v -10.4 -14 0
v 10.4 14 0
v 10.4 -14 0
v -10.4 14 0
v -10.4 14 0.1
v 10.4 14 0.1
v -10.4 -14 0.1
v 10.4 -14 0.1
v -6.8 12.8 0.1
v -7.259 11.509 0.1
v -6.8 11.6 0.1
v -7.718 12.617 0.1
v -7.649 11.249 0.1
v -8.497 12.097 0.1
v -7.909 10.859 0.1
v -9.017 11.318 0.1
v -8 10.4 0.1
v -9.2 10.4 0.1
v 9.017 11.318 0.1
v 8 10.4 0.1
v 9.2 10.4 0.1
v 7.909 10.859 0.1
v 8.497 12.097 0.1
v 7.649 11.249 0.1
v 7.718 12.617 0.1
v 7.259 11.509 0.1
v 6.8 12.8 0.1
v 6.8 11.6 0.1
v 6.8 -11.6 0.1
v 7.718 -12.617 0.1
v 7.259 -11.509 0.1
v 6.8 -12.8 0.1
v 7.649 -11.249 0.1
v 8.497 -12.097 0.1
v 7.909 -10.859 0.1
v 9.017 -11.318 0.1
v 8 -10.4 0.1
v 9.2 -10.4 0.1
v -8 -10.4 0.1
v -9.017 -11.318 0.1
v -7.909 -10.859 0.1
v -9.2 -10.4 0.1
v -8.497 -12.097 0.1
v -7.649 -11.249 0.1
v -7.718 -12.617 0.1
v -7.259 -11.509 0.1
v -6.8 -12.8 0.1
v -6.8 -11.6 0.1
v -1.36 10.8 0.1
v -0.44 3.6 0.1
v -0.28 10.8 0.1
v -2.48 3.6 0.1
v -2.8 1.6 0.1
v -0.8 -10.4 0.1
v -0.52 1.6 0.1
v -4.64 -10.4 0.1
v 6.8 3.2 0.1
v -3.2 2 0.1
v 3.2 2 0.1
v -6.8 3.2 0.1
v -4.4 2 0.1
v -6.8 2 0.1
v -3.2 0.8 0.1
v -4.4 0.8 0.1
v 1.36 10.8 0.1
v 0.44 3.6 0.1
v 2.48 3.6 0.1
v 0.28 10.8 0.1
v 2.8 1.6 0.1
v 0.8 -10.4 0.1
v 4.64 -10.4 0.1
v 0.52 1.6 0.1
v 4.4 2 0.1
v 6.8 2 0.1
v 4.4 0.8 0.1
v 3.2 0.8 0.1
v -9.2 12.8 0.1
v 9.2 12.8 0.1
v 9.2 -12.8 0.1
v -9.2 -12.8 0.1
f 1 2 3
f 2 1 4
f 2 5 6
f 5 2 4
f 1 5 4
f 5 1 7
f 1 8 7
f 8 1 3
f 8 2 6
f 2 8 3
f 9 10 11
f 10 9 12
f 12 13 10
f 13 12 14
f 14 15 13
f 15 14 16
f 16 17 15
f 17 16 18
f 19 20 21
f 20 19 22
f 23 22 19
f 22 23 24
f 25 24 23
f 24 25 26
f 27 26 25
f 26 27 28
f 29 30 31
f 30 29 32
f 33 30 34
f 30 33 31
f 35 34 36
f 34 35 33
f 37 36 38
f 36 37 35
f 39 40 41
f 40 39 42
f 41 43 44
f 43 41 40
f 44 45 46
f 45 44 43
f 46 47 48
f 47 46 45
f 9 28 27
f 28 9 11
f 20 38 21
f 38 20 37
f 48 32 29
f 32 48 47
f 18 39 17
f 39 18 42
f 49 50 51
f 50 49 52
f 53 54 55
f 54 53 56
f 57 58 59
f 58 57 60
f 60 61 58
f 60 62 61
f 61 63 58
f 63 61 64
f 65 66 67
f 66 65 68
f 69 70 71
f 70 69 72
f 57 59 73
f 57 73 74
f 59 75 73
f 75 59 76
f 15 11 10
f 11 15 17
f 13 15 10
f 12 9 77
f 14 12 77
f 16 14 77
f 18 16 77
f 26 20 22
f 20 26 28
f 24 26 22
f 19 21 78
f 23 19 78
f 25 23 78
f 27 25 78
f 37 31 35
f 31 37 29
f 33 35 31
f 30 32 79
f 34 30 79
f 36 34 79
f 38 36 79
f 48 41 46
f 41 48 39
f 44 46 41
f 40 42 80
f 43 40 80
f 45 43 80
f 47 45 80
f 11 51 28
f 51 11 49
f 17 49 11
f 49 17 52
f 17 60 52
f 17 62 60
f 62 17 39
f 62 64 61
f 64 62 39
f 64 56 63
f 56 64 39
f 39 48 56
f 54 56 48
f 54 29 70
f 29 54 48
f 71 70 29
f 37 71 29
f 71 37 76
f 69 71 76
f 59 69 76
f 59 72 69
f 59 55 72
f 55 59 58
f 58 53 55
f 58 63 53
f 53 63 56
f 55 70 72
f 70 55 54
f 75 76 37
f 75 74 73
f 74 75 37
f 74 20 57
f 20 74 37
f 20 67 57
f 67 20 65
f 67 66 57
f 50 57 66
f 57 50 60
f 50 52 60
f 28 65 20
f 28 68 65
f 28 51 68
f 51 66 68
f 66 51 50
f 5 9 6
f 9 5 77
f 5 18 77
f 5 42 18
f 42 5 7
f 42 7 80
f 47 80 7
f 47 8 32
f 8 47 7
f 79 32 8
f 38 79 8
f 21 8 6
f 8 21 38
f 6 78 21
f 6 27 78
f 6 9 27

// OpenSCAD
// file: ../p/1-4ndis.scad
use <../lib.scad>
function ldraw_lib__1_4ndis() = [
// 0 Disc Negative 0.25
// 0 Name: 1-4ndis.dat
// 0 Author: James Jessiman
// 0 !LDRAW_ORG Primitive UPDATE 2012-01
// 0 !LICENSE Licensed under CC BY 4.0 : see CAreadme.txt
// 
// 0 BFC CERTIFY CCW
  [0,"BFC","CERTIFY"],
  [0,"BFC","CCW"],
// 
// 0 !HISTORY 2002-03-23 [sbliss] Added BFC Statement
// 0 !HISTORY 2002-04-25 [PTadmin] Official Update 2002-02
// 0 !HISTORY 2007-06-22 [PTadmin] Header formatted for Contributor Agreement
// 0 !HISTORY 2008-07-01 [PTadmin] Official Update 2008-01
// 0 !HISTORY 2012-02-16 [Philo] Changed to CCW
// 0 !HISTORY 2012-03-30 [PTadmin] Official Update 2012-01
// 
// 
// 3 16 0.9239 0 0.3827 1 0 0 1 0 1
  [3,16,0.9239,0,0.3827,1,0,0,1,0,1],
// 3 16 0.7071 0 0.7071 0.9239 0 0.3827 1 0 1
  [3,16,0.7071,0,0.7071,0.9239,0,0.3827,1,0,1],
// 3 16 0.3827 0 0.9239 0.7071 0 0.7071 1 0 1
  [3,16,0.3827,0,0.9239,0.7071,0,0.7071,1,0,1],
// 3 16 0 0 1 0.3827 0 0.9239 1 0 1
  [3,16,0,0,1,0.3827,0,0.9239,1,0,1],
];
module ldraw_lib__1_4ndis(step=0, col=false, unit=2/5, alt=false, line=0.2, solid=!$preview)
    makepoly(ldraw_lib__1_4ndis(), step=step, col=col, unit=unit, alt=alt, line=line, solid=solid);
ldraw_lib__1_4ndis(line=0.2);
// file: ../p/1-4chrd.scad
use <../lib.scad>
function ldraw_lib__1_4chrd() = [
// 0 Chord 0.25
// 0 Name: 1-4chrd.dat
// 0 Author: Tony Hafner [hafhead]
// 0 !LDRAW_ORG Primitive UPDATE 2012-02
// 0 !LICENSE Licensed under CC BY 2.0 and CC BY 4.0 : see CAreadme.txt
// 
// 0 BFC CERTIFY CCW
  [0,"BFC","CERTIFY"],
  [0,"BFC","CCW"],
// 
// 0 !HISTORY 2004-04-22 [PTadmin] Official Update 2004-02
// 0 !HISTORY 2007-10-09 [PTadmin] Header formatted for Contributor Agreement
// 0 !HISTORY 2008-07-01 [PTadmin] Official Update 2008-01
// 0 !HISTORY 2012-08-02 [MMR1988] Re-creation with PrimGen2 and Rectifier
// 0 !HISTORY 2012-08-09 [PTadmin] Official Update 2012-02
// 
// 
// 4 16 0.9239 0 0.3827 0.3827 0 0.9239 0 0 1 1 0 0
  [4,16,0.9239,0,0.3827,0.3827,0,0.9239,0,0,1,1,0,0],
// 3 16 0.7071 0 0.7071 0.3827 0 0.9239 0.9239 0 0.3827
  [3,16,0.7071,0,0.7071,0.3827,0,0.9239,0.9239,0,0.3827],
];
module ldraw_lib__1_4chrd(step=0, col=false, unit=2/5, alt=false, line=0.2, solid=!$preview)
    makepoly(ldraw_lib__1_4chrd(), step=step, col=col, unit=unit, alt=alt, line=line, solid=solid);
ldraw_lib__1_4chrd(line=0.2);
// file: ../p/1-4ring1.scad
use <../lib.scad>
function ldraw_lib__1_4ring1() = [
// 0 Ring  1 x 0.25
// 0 Name: 1-4ring1.dat
// 0 Author: Chris Dee [cwdee]
// 0 !LDRAW_ORG Primitive UPDATE 2012-01
// 0 !LICENSE Licensed under CC BY 4.0 : see CAreadme.txt
// 
// 0 BFC CERTIFY CCW
  [0,"BFC","CERTIFY"],
  [0,"BFC","CCW"],
// 
// 0 !HISTORY 2000-05-07 [PTadmin] Official Update 2000-01
// 0 !HISTORY 2002-11-22 [hafhead] Added BFC statement
// 0 !HISTORY 2002-11-30 [PTadmin] Official Update 2002-05
// 0 !HISTORY 2007-06-22 [PTadmin] Header formatted for Contributor Agreement
// 0 !HISTORY 2008-07-01 [PTadmin] Official Update 2008-01
// 0 !HISTORY 2012-02-16 [Philo] Changed to CCW
// 0 !HISTORY 2012-03-30 [PTadmin] Official Update 2012-01
// 
// 
// 4 16 2 0 0 1.8478 0 0.7654 0.9239 0 0.3827 1 0 0
  [4,16,2,0,0,1.8478,0,0.7654,0.9239,0,0.3827,1,0,0],
// 4 16 1.8478 0 0.7654 1.4142 0 1.4142 0.7071 0 0.7071 0.9239 0 0.3827
  [4,16,1.8478,0,0.7654,1.4142,0,1.4142,0.7071,0,0.7071,0.9239,0,0.3827],
// 4 16 1.4142 0 1.4142 0.7654 0 1.8478 0.3827 0 0.9239 0.7071 0 0.7071
  [4,16,1.4142,0,1.4142,0.7654,0,1.8478,0.3827,0,0.9239,0.7071,0,0.7071],
// 4 16 0.7654 0 1.8478 0 0 2 0 0 1 0.3827 0 0.9239
  [4,16,0.7654,0,1.8478,0,0,2,0,0,1,0.3827,0,0.9239],
];
module ldraw_lib__1_4ring1(step=0, col=false, unit=2/5, alt=false, line=0.2, solid=!$preview)
    makepoly(ldraw_lib__1_4ring1(), step=step, col=col, unit=unit, alt=alt, line=line, solid=solid);
ldraw_lib__1_4ring1(line=0.2);
// file: s/194225bs02.scad
use <../../lib.scad>
use <../../p/1-4chrd.scad>
use <../../p/1-4ndis.scad>
function ldraw_lib__s__194225bs02() = [
// 0 ~Sticker  3.5 x  2.6 with White Motorway Logo - Background
// 0 Name: s\194225bs02.dat
// 0 Author: Takeshi Takahashi [RainbowDolphin]
// 0 !LDRAW_ORG Subpart UPDATE 2023-03
// 0 !LICENSE Licensed under CC BY 4.0 : see CAreadme.txt
// 
// 0 BFC CERTIFY CCW
  [0,"BFC","CERTIFY"],
  [0,"BFC","CCW"],
// 
// 0 !HISTORY 2023-06-24 [OrionP] Official Update 2023-03
// 
// 
// 1 16 -17 -0.25 26 0 0 -3 0 1 0 3 0 0 1-4chrd.dat
  [1,16,-17,-0.25,26,0,0,-3,0,1,0,3,0,0, ldraw_lib__1_4chrd()],
// 1 16 -17 -0.25 26 0 0 -6 0 1 0 6 0 0 1-4ndis.dat
  [1,16,-17,-0.25,26,0,0,-6,0,1,0,6,0,0, ldraw_lib__1_4ndis()],
// 1 16 17 -0.25 26 3 0 0 0 1 0 0 0 3 1-4chrd.dat
  [1,16,17,-0.25,26,3,0,0,0,1,0,0,0,3, ldraw_lib__1_4chrd()],
// 1 16 17 -0.25 26 6 0 0 0 1 0 0 0 6 1-4ndis.dat
  [1,16,17,-0.25,26,6,0,0,0,1,0,0,0,6, ldraw_lib__1_4ndis()],
// 1 16 17 -0.25 -26 0 0 3 0 1 0 -3 0 0 1-4chrd.dat
  [1,16,17,-0.25,-26,0,0,3,0,1,0,-3,0,0, ldraw_lib__1_4chrd()],
// 1 16 17 -0.25 -26 0 0 6 0 1 0 -6 0 0 1-4ndis.dat
  [1,16,17,-0.25,-26,0,0,6,0,1,0,-6,0,0, ldraw_lib__1_4ndis()],
// 1 16 -17 -0.25 -26 -3 0 0 0 1 0 0 0 -3 1-4chrd.dat
  [1,16,-17,-0.25,-26,-3,0,0,0,1,0,0,0,-3, ldraw_lib__1_4chrd()],
// 1 16 -17 -0.25 -26 -6 0 0 0 1 0 0 0 -6 1-4ndis.dat
  [1,16,-17,-0.25,-26,-6,0,0,0,1,0,0,0,-6, ldraw_lib__1_4ndis()],
// 4 16 -0.7 -0.25 27 17 -0.25 29 -17 -0.25 29 -3.4 -0.25 27
  [4,16,-0.7,-0.25,27,17,-0.25,29,-17,-0.25,29,-3.4,-0.25,27],
// 4 16 -3.4 -0.25 27 -17 -0.25 29 -20 -0.25 26 -6.2 -0.25 9
  [4,16,-3.4,-0.25,27,-17,-0.25,29,-20,-0.25,26,-6.2,-0.25,9],
// 3 16 -20 -0.25 26 -17 -0.25 8 -6.2 -0.25 9
  [3,16,-20,-0.25,26,-17,-0.25,8,-6.2,-0.25,9],
// 4 16 -17 -0.25 5 -17 -0.25 8 -20 -0.25 26 -20 -0.25 -26
  [4,16,-17,-0.25,5,-17,-0.25,8,-20,-0.25,26,-20,-0.25,-26],
// 4 16 -11 -0.25 5 -17 -0.25 5 -20 -0.25 -26 -11 -0.25 2
  [4,16,-11,-0.25,5,-17,-0.25,5,-20,-0.25,-26,-11,-0.25,2],
// 4 16 -8 -0.25 2 -11 -0.25 2 -20 -0.25 -26 -11.6 -0.25 -26
  [4,16,-8,-0.25,2,-11,-0.25,2,-20,-0.25,-26,-11.6,-0.25,-26],
// 3 16 -20 -0.25 -26 -17 -0.25 -29 -11.6 -0.25 -26
  [3,16,-20,-0.25,-26,-17,-0.25,-29,-11.6,-0.25,-26],
// 3 16 -2 -0.25 -26 -11.6 -0.25 -26 -17 -0.25 -29
  [3,16,-2,-0.25,-26,-11.6,-0.25,-26,-17,-0.25,-29],
// 4 16 2 -0.25 -26 -2 -0.25 -26 -17 -0.25 -29 17 -0.25 -29
  [4,16,2,-0.25,-26,-2,-0.25,-26,-17,-0.25,-29,17,-0.25,-29],
// 3 16 11.6 -0.25 -26 2 -0.25 -26 17 -0.25 -29
  [3,16,11.6,-0.25,-26,2,-0.25,-26,17,-0.25,-29],
// 4 16 11.6 -0.25 -26 17 -0.25 -29 20 -0.25 -26 8 -0.25 2
  [4,16,11.6,-0.25,-26,17,-0.25,-29,20,-0.25,-26,8,-0.25,2],
// 3 16 7 -0.25 4 11.6 -0.25 -26 8 -0.25 2
  [3,16,7,-0.25,4,11.6,-0.25,-26,8,-0.25,2],
// 3 16 8 -0.25 5 7 -0.25 4 8 -0.25 2
  [3,16,8,-0.25,5,7,-0.25,4,8,-0.25,2],
// 3 16 8 -0.25 5 1.3 -0.25 4 7 -0.25 4
  [3,16,8,-0.25,5,1.3,-0.25,4,7,-0.25,4],
// 4 16 -1.3 -0.25 4 1.3 -0.25 4 8 -0.25 5 -8 -0.25 5
  [4,16,-1.3,-0.25,4,1.3,-0.25,4,8,-0.25,5,-8,-0.25,5],
// 3 16 -8 -0.25 5 -7 -0.25 4 -1.3 -0.25 4
  [3,16,-8,-0.25,5,-7,-0.25,4,-1.3,-0.25,4],
// 3 16 -8 -0.25 5 -8 -0.25 2 -7 -0.25 4
  [3,16,-8,-0.25,5,-8,-0.25,2,-7,-0.25,4],
// 3 16 -7 -0.25 4 -8 -0.25 2 -11.6 -0.25 -26
  [3,16,-7,-0.25,4,-8,-0.25,2,-11.6,-0.25,-26],
// 4 16 1.3 -0.25 4 -1.3 -0.25 4 -2 -0.25 -26 2 -0.25 -26
  [4,16,1.3,-0.25,4,-1.3,-0.25,4,-2,-0.25,-26,2,-0.25,-26],
// 3 16 11 -0.25 2 8 -0.25 2 20 -0.25 -26
  [3,16,11,-0.25,2,8,-0.25,2,20,-0.25,-26],
// 4 16 11 -0.25 5 11 -0.25 2 20 -0.25 -26 17 -0.25 5
  [4,16,11,-0.25,5,11,-0.25,2,20,-0.25,-26,17,-0.25,5],
// 4 16 17 -0.25 5 20 -0.25 -26 20 -0.25 26 17 -0.25 8
  [4,16,17,-0.25,5,20,-0.25,-26,20,-0.25,26,17,-0.25,8],
// 4 16 6.2 -0.25 9 17 -0.25 8 20 -0.25 26 3.4 -0.25 27
  [4,16,6.2,-0.25,9,17,-0.25,8,20,-0.25,26,3.4,-0.25,27],
// 3 16 6.2 -0.25 9 1.1 -0.25 9 17 -0.25 8
  [3,16,6.2,-0.25,9,1.1,-0.25,9,17,-0.25,8],
// 4 16 17 -0.25 8 1.1 -0.25 9 -1.1 -0.25 9 -17 -0.25 8
  [4,16,17,-0.25,8,1.1,-0.25,9,-1.1,-0.25,9,-17,-0.25,8],
// 3 16 -1.1 -0.25 9 -6.2 -0.25 9 -17 -0.25 8
  [3,16,-1.1,-0.25,9,-6.2,-0.25,9,-17,-0.25,8],
// 3 16 17 -0.25 29 3.4 -0.25 27 20 -0.25 26
  [3,16,17,-0.25,29,3.4,-0.25,27,20,-0.25,26],
// 3 16 17 -0.25 29 0.7 -0.25 27 3.4 -0.25 27
  [3,16,17,-0.25,29,0.7,-0.25,27,3.4,-0.25,27],
// 3 16 17 -0.25 29 -0.7 -0.25 27 0.7 -0.25 27
  [3,16,17,-0.25,29,-0.7,-0.25,27,0.7,-0.25,27],
// 4 16 0.7 -0.25 27 -0.7 -0.25 27 -1.1 -0.25 9 1.1 -0.25 9
  [4,16,0.7,-0.25,27,-0.7,-0.25,27,-1.1,-0.25,9,1.1,-0.25,9],
// 4 16 -17 -0.25 32 26 -0.25 35 -26 -0.25 35 -23 -0.25 32
  [4,16,-17,-0.25,32,26,-0.25,35,-26,-0.25,35,-23,-0.25,32],
// 3 16 -26 -0.25 35 -23 -0.25 26 -23 -0.25 32
  [3,16,-26,-0.25,35,-23,-0.25,26,-23,-0.25,32],
// 4 16 -23 -0.25 -26 -23 -0.25 26 -26 -0.25 35 -26 -0.25 -35
  [4,16,-23,-0.25,-26,-23,-0.25,26,-26,-0.25,35,-26,-0.25,-35],
// 3 16 -23 -0.25 -26 -26 -0.25 -35 -23 -0.25 -32
  [3,16,-23,-0.25,-26,-26,-0.25,-35,-23,-0.25,-32],
// 3 16 -17 -0.25 -32 -23 -0.25 -32 -26 -0.25 -35
  [3,16,-17,-0.25,-32,-23,-0.25,-32,-26,-0.25,-35],
// 4 16 17 -0.25 -32 -17 -0.25 -32 -26 -0.25 -35 26 -0.25 -35
  [4,16,17,-0.25,-32,-17,-0.25,-32,-26,-0.25,-35,26,-0.25,-35],
// 3 16 23 -0.25 -32 17 -0.25 -32 26 -0.25 -35
  [3,16,23,-0.25,-32,17,-0.25,-32,26,-0.25,-35],
// 3 16 23 -0.25 -26 23 -0.25 -32 26 -0.25 -35
  [3,16,23,-0.25,-26,23,-0.25,-32,26,-0.25,-35],
// 4 16 23 -0.25 26 23 -0.25 -26 26 -0.25 -35 26 -0.25 35
  [4,16,23,-0.25,26,23,-0.25,-26,26,-0.25,-35,26,-0.25,35],
// 3 16 26 -0.25 35 23 -0.25 32 23 -0.25 26
  [3,16,26,-0.25,35,23,-0.25,32,23,-0.25,26],
// 3 16 26 -0.25 35 17 -0.25 32 23 -0.25 32
  [3,16,26,-0.25,35,17,-0.25,32,23,-0.25,32],
// 3 16 26 -0.25 35 -17 -0.25 32 17 -0.25 32
  [3,16,26,-0.25,35,-17,-0.25,32,17,-0.25,32],
];
module ldraw_lib__s__194225bs02(step=0, col=false, unit=2/5, alt=false, line=0.2, solid=!$preview)
    makepoly(ldraw_lib__s__194225bs02(), step=step, col=col, unit=unit, alt=alt, line=line, solid=solid);
ldraw_lib__s__194225bs02(line=0.2);
// file: s/194225bs01.scad
use <../../lib.scad>
use <../../p/1-4ring1.scad>
function ldraw_lib__s__194225bs01() = [
// 0 ~Sticker  3.5 x  2.6 with White Motorway Logo - Foreground
// 0 Name: s\194225bs01.dat
// 0 Author: Takeshi Takahashi [RainbowDolphin]
// 0 !LDRAW_ORG Subpart UPDATE 2023-03
// 0 !LICENSE Licensed under CC BY 4.0 : see CAreadme.txt
// 
// 0 BFC CERTIFY CCW
  [0,"BFC","CERTIFY"],
  [0,"BFC","CCW"],
// 
// 0 !HISTORY 2023-06-24 [OrionP] Official Update 2023-03
// 
// 
// 1 15 -17 -0.25 26 0 0 -3 0 1 0 3 0 0 1-4ring1.dat
  [1,15,-17,-0.25,26,0,0,-3,0,1,0,3,0,0, ldraw_lib__1_4ring1()],
// 1 15 17 -0.25 26 3 0 0 0 1 0 0 0 3 1-4ring1.dat
  [1,15,17,-0.25,26,3,0,0,0,1,0,0,0,3, ldraw_lib__1_4ring1()],
// 1 15 17 -0.25 -26 0 0 3 0 1 0 -3 0 0 1-4ring1.dat
  [1,15,17,-0.25,-26,0,0,3,0,1,0,-3,0,0, ldraw_lib__1_4ring1()],
// 1 15 -17 -0.25 -26 -3 0 0 0 1 0 0 0 -3 1-4ring1.dat
  [1,15,-17,-0.25,-26,-3,0,0,0,1,0,0,0,-3, ldraw_lib__1_4ring1()],
// 4 15 17 -0.25 32 -17 -0.25 32 -17 -0.25 29 17 -0.25 29
  [4,15,17,-0.25,32,-17,-0.25,32,-17,-0.25,29,17,-0.25,29],
// 4 15 23 -0.25 26 20 -0.25 26 20 -0.25 -26 23 -0.25 -26
  [4,15,23,-0.25,26,20,-0.25,26,20,-0.25,-26,23,-0.25,-26],
// 4 15 17 -0.25 -29 -17 -0.25 -29 -17 -0.25 -32 17 -0.25 -32
  [4,15,17,-0.25,-29,-17,-0.25,-29,-17,-0.25,-32,17,-0.25,-32],
// 4 15 -23 -0.25 -26 -20 -0.25 -26 -20 -0.25 26 -23 -0.25 26
  [4,15,-23,-0.25,-26,-20,-0.25,-26,-20,-0.25,26,-23,-0.25,26],
// 4 15 -1.1 -0.25 9 -0.7 -0.25 27 -3.4 -0.25 27 -6.2 -0.25 9
  [4,15,-1.1,-0.25,9,-0.7,-0.25,27,-3.4,-0.25,27,-6.2,-0.25,9],
// 4 15 -11.6 -0.25 -26 -2 -0.25 -26 -1.3 -0.25 4 -7 -0.25 4
  [4,15,-11.6,-0.25,-26,-2,-0.25,-26,-1.3,-0.25,4,-7,-0.25,4],
// 4 15 8 -0.25 5 17 -0.25 8 -17 -0.25 8 -8 -0.25 5
  [4,15,8,-0.25,5,17,-0.25,8,-17,-0.25,8,-8,-0.25,5],
// 3 15 -17 -0.25 8 -11 -0.25 5 -8 -0.25 5
  [3,15,-17,-0.25,8,-11,-0.25,5,-8,-0.25,5],
// 3 15 -17 -0.25 8 -17 -0.25 5 -11 -0.25 5
  [3,15,-17,-0.25,8,-17,-0.25,5,-11,-0.25,5],
// 4 15 -8 -0.25 5 -11 -0.25 5 -11 -0.25 2 -8 -0.25 2
  [4,15,-8,-0.25,5,-11,-0.25,5,-11,-0.25,2,-8,-0.25,2],
// 4 15 3.4 -0.25 27 0.7 -0.25 27 1.1 -0.25 9 6.2 -0.25 9
  [4,15,3.4,-0.25,27,0.7,-0.25,27,1.1,-0.25,9,6.2,-0.25,9],
// 4 15 1.3 -0.25 4 2 -0.25 -26 11.6 -0.25 -26 7 -0.25 4
  [4,15,1.3,-0.25,4,2,-0.25,-26,11.6,-0.25,-26,7,-0.25,4],
// 3 15 17 -0.25 8 8 -0.25 5 11 -0.25 5
  [3,15,17,-0.25,8,8,-0.25,5,11,-0.25,5],
// 3 15 17 -0.25 8 11 -0.25 5 17 -0.25 5
  [3,15,17,-0.25,8,11,-0.25,5,17,-0.25,5],
// 4 15 11 -0.25 2 11 -0.25 5 8 -0.25 5 8 -0.25 2
  [4,15,11,-0.25,2,11,-0.25,5,8,-0.25,5,8,-0.25,2],
];
module ldraw_lib__s__194225bs01(step=0, col=false, unit=2/5, alt=false, line=0.2, solid=!$preview)
    makepoly(ldraw_lib__s__194225bs01(), step=step, col=col, unit=unit, alt=alt, line=line, solid=solid);
ldraw_lib__s__194225bs01(line=0.2);
// file: ../p/box5-12.scad
use <../lib.scad>
function ldraw_lib__box5_12() = [
// 0 Box with 5 Faces without Any Edges
// 0 Name: box5-12.dat
// 0 Author: Chris Dee [cwdee]
// 0 !LDRAW_ORG Primitive UPDATE 2009-02
// 0 !LICENSE Licensed under CC BY 4.0 : see CAreadme.txt
// 
// 0 BFC CERTIFY CCW
  [0,"BFC","CERTIFY"],
  [0,"BFC","CCW"],
// 
// 0 !HISTORY 2009-09-03 [PTadmin] Official Update 2009-02
// 
// 
// 4 16 1 1 1 1 1 -1 -1 1 -1 -1 1 1
  [4,16,1,1,1,1,1,-1,-1,1,-1,-1,1,1],
// 4 16 -1 0 1 1 0 1 1 1 1 -1 1 1
  [4,16,-1,0,1,1,0,1,1,1,1,-1,1,1],
// 4 16 -1 0 -1 -1 0 1 -1 1 1 -1 1 -1
  [4,16,-1,0,-1,-1,0,1,-1,1,1,-1,1,-1],
// 4 16 1 0 -1 -1 0 -1 -1 1 -1 1 1 -1
  [4,16,1,0,-1,-1,0,-1,-1,1,-1,1,1,-1],
// 4 16 1 0 1 1 0 -1 1 1 -1 1 1 1
  [4,16,1,0,1,1,0,-1,1,1,-1,1,1,1],
// 0
];
module ldraw_lib__box5_12(step=0, col=false, unit=2/5, alt=false, line=0.2, solid=!$preview)
    makepoly(ldraw_lib__box5_12(), step=step, col=col, unit=unit, alt=alt, line=line, solid=solid);
ldraw_lib__box5_12(line=0.2);
// main file
use <../lib.scad>
use <../p/box5-12.scad>
use <s/194225bs01.scad>
use <s/194225bs02.scad>
function ldraw_lib__194225b() = [
// 0 Sticker  3.5 x  2.6 with White Motorway Logo on Transparent Background
// 0 Name: 194225b.dat
// 0 Author: Takeshi Takahashi [RainbowDolphin]
// 0 !LDRAW_ORG Part UPDATE 2023-03
// 0 !LICENSE Licensed under CC BY 4.0 : see CAreadme.txt
// 
// 0 BFC CERTIFY CCW
  [0,"BFC","CERTIFY"],
  [0,"BFC","CCW"],
// 
// 0 !KEYWORDS Freeway, Highway, Road maintenance, Set 6653
// 
// 0 !HISTORY 2023-06-24 [OrionP] Official Update 2023-03
// 
// 
// 1 16 0 -0.25 0 26 0 0 0 0.25 0 0 0 35 box5-12.dat
  [1,16,0,-0.25,0,26,0,0,0,0.25,0,0,0,35, ldraw_lib__box5_12()],
// 0 BFC NOCLIP
  [0,"BFC","NOCLIP"],
// 1 15 0 0 0 1 0 0 0 1 0 0 0 1 s\194225bs01.dat
  [1,15,0,0,0,1,0,0,0,1,0,0,0,1, ldraw_lib__s__194225bs01()],
// 0 BFC CLIP
  [0,"BFC","CLIP"],
// 1 16 0 0 0 1 0 0 0 1 0 0 0 1 s\194225bs02.dat
  [1,16,0,0,0,1,0,0,0,1,0,0,0,1, ldraw_lib__s__194225bs02()],
];
module ldraw_lib__194225b(step=0, col=false, unit=2/5, alt=false, line=0.2, solid=!$preview)
    makepoly(ldraw_lib__194225b(), step=step, col=col, unit=unit, alt=alt, line=line, solid=solid);
ldraw_lib__194225b(line=0.2);
